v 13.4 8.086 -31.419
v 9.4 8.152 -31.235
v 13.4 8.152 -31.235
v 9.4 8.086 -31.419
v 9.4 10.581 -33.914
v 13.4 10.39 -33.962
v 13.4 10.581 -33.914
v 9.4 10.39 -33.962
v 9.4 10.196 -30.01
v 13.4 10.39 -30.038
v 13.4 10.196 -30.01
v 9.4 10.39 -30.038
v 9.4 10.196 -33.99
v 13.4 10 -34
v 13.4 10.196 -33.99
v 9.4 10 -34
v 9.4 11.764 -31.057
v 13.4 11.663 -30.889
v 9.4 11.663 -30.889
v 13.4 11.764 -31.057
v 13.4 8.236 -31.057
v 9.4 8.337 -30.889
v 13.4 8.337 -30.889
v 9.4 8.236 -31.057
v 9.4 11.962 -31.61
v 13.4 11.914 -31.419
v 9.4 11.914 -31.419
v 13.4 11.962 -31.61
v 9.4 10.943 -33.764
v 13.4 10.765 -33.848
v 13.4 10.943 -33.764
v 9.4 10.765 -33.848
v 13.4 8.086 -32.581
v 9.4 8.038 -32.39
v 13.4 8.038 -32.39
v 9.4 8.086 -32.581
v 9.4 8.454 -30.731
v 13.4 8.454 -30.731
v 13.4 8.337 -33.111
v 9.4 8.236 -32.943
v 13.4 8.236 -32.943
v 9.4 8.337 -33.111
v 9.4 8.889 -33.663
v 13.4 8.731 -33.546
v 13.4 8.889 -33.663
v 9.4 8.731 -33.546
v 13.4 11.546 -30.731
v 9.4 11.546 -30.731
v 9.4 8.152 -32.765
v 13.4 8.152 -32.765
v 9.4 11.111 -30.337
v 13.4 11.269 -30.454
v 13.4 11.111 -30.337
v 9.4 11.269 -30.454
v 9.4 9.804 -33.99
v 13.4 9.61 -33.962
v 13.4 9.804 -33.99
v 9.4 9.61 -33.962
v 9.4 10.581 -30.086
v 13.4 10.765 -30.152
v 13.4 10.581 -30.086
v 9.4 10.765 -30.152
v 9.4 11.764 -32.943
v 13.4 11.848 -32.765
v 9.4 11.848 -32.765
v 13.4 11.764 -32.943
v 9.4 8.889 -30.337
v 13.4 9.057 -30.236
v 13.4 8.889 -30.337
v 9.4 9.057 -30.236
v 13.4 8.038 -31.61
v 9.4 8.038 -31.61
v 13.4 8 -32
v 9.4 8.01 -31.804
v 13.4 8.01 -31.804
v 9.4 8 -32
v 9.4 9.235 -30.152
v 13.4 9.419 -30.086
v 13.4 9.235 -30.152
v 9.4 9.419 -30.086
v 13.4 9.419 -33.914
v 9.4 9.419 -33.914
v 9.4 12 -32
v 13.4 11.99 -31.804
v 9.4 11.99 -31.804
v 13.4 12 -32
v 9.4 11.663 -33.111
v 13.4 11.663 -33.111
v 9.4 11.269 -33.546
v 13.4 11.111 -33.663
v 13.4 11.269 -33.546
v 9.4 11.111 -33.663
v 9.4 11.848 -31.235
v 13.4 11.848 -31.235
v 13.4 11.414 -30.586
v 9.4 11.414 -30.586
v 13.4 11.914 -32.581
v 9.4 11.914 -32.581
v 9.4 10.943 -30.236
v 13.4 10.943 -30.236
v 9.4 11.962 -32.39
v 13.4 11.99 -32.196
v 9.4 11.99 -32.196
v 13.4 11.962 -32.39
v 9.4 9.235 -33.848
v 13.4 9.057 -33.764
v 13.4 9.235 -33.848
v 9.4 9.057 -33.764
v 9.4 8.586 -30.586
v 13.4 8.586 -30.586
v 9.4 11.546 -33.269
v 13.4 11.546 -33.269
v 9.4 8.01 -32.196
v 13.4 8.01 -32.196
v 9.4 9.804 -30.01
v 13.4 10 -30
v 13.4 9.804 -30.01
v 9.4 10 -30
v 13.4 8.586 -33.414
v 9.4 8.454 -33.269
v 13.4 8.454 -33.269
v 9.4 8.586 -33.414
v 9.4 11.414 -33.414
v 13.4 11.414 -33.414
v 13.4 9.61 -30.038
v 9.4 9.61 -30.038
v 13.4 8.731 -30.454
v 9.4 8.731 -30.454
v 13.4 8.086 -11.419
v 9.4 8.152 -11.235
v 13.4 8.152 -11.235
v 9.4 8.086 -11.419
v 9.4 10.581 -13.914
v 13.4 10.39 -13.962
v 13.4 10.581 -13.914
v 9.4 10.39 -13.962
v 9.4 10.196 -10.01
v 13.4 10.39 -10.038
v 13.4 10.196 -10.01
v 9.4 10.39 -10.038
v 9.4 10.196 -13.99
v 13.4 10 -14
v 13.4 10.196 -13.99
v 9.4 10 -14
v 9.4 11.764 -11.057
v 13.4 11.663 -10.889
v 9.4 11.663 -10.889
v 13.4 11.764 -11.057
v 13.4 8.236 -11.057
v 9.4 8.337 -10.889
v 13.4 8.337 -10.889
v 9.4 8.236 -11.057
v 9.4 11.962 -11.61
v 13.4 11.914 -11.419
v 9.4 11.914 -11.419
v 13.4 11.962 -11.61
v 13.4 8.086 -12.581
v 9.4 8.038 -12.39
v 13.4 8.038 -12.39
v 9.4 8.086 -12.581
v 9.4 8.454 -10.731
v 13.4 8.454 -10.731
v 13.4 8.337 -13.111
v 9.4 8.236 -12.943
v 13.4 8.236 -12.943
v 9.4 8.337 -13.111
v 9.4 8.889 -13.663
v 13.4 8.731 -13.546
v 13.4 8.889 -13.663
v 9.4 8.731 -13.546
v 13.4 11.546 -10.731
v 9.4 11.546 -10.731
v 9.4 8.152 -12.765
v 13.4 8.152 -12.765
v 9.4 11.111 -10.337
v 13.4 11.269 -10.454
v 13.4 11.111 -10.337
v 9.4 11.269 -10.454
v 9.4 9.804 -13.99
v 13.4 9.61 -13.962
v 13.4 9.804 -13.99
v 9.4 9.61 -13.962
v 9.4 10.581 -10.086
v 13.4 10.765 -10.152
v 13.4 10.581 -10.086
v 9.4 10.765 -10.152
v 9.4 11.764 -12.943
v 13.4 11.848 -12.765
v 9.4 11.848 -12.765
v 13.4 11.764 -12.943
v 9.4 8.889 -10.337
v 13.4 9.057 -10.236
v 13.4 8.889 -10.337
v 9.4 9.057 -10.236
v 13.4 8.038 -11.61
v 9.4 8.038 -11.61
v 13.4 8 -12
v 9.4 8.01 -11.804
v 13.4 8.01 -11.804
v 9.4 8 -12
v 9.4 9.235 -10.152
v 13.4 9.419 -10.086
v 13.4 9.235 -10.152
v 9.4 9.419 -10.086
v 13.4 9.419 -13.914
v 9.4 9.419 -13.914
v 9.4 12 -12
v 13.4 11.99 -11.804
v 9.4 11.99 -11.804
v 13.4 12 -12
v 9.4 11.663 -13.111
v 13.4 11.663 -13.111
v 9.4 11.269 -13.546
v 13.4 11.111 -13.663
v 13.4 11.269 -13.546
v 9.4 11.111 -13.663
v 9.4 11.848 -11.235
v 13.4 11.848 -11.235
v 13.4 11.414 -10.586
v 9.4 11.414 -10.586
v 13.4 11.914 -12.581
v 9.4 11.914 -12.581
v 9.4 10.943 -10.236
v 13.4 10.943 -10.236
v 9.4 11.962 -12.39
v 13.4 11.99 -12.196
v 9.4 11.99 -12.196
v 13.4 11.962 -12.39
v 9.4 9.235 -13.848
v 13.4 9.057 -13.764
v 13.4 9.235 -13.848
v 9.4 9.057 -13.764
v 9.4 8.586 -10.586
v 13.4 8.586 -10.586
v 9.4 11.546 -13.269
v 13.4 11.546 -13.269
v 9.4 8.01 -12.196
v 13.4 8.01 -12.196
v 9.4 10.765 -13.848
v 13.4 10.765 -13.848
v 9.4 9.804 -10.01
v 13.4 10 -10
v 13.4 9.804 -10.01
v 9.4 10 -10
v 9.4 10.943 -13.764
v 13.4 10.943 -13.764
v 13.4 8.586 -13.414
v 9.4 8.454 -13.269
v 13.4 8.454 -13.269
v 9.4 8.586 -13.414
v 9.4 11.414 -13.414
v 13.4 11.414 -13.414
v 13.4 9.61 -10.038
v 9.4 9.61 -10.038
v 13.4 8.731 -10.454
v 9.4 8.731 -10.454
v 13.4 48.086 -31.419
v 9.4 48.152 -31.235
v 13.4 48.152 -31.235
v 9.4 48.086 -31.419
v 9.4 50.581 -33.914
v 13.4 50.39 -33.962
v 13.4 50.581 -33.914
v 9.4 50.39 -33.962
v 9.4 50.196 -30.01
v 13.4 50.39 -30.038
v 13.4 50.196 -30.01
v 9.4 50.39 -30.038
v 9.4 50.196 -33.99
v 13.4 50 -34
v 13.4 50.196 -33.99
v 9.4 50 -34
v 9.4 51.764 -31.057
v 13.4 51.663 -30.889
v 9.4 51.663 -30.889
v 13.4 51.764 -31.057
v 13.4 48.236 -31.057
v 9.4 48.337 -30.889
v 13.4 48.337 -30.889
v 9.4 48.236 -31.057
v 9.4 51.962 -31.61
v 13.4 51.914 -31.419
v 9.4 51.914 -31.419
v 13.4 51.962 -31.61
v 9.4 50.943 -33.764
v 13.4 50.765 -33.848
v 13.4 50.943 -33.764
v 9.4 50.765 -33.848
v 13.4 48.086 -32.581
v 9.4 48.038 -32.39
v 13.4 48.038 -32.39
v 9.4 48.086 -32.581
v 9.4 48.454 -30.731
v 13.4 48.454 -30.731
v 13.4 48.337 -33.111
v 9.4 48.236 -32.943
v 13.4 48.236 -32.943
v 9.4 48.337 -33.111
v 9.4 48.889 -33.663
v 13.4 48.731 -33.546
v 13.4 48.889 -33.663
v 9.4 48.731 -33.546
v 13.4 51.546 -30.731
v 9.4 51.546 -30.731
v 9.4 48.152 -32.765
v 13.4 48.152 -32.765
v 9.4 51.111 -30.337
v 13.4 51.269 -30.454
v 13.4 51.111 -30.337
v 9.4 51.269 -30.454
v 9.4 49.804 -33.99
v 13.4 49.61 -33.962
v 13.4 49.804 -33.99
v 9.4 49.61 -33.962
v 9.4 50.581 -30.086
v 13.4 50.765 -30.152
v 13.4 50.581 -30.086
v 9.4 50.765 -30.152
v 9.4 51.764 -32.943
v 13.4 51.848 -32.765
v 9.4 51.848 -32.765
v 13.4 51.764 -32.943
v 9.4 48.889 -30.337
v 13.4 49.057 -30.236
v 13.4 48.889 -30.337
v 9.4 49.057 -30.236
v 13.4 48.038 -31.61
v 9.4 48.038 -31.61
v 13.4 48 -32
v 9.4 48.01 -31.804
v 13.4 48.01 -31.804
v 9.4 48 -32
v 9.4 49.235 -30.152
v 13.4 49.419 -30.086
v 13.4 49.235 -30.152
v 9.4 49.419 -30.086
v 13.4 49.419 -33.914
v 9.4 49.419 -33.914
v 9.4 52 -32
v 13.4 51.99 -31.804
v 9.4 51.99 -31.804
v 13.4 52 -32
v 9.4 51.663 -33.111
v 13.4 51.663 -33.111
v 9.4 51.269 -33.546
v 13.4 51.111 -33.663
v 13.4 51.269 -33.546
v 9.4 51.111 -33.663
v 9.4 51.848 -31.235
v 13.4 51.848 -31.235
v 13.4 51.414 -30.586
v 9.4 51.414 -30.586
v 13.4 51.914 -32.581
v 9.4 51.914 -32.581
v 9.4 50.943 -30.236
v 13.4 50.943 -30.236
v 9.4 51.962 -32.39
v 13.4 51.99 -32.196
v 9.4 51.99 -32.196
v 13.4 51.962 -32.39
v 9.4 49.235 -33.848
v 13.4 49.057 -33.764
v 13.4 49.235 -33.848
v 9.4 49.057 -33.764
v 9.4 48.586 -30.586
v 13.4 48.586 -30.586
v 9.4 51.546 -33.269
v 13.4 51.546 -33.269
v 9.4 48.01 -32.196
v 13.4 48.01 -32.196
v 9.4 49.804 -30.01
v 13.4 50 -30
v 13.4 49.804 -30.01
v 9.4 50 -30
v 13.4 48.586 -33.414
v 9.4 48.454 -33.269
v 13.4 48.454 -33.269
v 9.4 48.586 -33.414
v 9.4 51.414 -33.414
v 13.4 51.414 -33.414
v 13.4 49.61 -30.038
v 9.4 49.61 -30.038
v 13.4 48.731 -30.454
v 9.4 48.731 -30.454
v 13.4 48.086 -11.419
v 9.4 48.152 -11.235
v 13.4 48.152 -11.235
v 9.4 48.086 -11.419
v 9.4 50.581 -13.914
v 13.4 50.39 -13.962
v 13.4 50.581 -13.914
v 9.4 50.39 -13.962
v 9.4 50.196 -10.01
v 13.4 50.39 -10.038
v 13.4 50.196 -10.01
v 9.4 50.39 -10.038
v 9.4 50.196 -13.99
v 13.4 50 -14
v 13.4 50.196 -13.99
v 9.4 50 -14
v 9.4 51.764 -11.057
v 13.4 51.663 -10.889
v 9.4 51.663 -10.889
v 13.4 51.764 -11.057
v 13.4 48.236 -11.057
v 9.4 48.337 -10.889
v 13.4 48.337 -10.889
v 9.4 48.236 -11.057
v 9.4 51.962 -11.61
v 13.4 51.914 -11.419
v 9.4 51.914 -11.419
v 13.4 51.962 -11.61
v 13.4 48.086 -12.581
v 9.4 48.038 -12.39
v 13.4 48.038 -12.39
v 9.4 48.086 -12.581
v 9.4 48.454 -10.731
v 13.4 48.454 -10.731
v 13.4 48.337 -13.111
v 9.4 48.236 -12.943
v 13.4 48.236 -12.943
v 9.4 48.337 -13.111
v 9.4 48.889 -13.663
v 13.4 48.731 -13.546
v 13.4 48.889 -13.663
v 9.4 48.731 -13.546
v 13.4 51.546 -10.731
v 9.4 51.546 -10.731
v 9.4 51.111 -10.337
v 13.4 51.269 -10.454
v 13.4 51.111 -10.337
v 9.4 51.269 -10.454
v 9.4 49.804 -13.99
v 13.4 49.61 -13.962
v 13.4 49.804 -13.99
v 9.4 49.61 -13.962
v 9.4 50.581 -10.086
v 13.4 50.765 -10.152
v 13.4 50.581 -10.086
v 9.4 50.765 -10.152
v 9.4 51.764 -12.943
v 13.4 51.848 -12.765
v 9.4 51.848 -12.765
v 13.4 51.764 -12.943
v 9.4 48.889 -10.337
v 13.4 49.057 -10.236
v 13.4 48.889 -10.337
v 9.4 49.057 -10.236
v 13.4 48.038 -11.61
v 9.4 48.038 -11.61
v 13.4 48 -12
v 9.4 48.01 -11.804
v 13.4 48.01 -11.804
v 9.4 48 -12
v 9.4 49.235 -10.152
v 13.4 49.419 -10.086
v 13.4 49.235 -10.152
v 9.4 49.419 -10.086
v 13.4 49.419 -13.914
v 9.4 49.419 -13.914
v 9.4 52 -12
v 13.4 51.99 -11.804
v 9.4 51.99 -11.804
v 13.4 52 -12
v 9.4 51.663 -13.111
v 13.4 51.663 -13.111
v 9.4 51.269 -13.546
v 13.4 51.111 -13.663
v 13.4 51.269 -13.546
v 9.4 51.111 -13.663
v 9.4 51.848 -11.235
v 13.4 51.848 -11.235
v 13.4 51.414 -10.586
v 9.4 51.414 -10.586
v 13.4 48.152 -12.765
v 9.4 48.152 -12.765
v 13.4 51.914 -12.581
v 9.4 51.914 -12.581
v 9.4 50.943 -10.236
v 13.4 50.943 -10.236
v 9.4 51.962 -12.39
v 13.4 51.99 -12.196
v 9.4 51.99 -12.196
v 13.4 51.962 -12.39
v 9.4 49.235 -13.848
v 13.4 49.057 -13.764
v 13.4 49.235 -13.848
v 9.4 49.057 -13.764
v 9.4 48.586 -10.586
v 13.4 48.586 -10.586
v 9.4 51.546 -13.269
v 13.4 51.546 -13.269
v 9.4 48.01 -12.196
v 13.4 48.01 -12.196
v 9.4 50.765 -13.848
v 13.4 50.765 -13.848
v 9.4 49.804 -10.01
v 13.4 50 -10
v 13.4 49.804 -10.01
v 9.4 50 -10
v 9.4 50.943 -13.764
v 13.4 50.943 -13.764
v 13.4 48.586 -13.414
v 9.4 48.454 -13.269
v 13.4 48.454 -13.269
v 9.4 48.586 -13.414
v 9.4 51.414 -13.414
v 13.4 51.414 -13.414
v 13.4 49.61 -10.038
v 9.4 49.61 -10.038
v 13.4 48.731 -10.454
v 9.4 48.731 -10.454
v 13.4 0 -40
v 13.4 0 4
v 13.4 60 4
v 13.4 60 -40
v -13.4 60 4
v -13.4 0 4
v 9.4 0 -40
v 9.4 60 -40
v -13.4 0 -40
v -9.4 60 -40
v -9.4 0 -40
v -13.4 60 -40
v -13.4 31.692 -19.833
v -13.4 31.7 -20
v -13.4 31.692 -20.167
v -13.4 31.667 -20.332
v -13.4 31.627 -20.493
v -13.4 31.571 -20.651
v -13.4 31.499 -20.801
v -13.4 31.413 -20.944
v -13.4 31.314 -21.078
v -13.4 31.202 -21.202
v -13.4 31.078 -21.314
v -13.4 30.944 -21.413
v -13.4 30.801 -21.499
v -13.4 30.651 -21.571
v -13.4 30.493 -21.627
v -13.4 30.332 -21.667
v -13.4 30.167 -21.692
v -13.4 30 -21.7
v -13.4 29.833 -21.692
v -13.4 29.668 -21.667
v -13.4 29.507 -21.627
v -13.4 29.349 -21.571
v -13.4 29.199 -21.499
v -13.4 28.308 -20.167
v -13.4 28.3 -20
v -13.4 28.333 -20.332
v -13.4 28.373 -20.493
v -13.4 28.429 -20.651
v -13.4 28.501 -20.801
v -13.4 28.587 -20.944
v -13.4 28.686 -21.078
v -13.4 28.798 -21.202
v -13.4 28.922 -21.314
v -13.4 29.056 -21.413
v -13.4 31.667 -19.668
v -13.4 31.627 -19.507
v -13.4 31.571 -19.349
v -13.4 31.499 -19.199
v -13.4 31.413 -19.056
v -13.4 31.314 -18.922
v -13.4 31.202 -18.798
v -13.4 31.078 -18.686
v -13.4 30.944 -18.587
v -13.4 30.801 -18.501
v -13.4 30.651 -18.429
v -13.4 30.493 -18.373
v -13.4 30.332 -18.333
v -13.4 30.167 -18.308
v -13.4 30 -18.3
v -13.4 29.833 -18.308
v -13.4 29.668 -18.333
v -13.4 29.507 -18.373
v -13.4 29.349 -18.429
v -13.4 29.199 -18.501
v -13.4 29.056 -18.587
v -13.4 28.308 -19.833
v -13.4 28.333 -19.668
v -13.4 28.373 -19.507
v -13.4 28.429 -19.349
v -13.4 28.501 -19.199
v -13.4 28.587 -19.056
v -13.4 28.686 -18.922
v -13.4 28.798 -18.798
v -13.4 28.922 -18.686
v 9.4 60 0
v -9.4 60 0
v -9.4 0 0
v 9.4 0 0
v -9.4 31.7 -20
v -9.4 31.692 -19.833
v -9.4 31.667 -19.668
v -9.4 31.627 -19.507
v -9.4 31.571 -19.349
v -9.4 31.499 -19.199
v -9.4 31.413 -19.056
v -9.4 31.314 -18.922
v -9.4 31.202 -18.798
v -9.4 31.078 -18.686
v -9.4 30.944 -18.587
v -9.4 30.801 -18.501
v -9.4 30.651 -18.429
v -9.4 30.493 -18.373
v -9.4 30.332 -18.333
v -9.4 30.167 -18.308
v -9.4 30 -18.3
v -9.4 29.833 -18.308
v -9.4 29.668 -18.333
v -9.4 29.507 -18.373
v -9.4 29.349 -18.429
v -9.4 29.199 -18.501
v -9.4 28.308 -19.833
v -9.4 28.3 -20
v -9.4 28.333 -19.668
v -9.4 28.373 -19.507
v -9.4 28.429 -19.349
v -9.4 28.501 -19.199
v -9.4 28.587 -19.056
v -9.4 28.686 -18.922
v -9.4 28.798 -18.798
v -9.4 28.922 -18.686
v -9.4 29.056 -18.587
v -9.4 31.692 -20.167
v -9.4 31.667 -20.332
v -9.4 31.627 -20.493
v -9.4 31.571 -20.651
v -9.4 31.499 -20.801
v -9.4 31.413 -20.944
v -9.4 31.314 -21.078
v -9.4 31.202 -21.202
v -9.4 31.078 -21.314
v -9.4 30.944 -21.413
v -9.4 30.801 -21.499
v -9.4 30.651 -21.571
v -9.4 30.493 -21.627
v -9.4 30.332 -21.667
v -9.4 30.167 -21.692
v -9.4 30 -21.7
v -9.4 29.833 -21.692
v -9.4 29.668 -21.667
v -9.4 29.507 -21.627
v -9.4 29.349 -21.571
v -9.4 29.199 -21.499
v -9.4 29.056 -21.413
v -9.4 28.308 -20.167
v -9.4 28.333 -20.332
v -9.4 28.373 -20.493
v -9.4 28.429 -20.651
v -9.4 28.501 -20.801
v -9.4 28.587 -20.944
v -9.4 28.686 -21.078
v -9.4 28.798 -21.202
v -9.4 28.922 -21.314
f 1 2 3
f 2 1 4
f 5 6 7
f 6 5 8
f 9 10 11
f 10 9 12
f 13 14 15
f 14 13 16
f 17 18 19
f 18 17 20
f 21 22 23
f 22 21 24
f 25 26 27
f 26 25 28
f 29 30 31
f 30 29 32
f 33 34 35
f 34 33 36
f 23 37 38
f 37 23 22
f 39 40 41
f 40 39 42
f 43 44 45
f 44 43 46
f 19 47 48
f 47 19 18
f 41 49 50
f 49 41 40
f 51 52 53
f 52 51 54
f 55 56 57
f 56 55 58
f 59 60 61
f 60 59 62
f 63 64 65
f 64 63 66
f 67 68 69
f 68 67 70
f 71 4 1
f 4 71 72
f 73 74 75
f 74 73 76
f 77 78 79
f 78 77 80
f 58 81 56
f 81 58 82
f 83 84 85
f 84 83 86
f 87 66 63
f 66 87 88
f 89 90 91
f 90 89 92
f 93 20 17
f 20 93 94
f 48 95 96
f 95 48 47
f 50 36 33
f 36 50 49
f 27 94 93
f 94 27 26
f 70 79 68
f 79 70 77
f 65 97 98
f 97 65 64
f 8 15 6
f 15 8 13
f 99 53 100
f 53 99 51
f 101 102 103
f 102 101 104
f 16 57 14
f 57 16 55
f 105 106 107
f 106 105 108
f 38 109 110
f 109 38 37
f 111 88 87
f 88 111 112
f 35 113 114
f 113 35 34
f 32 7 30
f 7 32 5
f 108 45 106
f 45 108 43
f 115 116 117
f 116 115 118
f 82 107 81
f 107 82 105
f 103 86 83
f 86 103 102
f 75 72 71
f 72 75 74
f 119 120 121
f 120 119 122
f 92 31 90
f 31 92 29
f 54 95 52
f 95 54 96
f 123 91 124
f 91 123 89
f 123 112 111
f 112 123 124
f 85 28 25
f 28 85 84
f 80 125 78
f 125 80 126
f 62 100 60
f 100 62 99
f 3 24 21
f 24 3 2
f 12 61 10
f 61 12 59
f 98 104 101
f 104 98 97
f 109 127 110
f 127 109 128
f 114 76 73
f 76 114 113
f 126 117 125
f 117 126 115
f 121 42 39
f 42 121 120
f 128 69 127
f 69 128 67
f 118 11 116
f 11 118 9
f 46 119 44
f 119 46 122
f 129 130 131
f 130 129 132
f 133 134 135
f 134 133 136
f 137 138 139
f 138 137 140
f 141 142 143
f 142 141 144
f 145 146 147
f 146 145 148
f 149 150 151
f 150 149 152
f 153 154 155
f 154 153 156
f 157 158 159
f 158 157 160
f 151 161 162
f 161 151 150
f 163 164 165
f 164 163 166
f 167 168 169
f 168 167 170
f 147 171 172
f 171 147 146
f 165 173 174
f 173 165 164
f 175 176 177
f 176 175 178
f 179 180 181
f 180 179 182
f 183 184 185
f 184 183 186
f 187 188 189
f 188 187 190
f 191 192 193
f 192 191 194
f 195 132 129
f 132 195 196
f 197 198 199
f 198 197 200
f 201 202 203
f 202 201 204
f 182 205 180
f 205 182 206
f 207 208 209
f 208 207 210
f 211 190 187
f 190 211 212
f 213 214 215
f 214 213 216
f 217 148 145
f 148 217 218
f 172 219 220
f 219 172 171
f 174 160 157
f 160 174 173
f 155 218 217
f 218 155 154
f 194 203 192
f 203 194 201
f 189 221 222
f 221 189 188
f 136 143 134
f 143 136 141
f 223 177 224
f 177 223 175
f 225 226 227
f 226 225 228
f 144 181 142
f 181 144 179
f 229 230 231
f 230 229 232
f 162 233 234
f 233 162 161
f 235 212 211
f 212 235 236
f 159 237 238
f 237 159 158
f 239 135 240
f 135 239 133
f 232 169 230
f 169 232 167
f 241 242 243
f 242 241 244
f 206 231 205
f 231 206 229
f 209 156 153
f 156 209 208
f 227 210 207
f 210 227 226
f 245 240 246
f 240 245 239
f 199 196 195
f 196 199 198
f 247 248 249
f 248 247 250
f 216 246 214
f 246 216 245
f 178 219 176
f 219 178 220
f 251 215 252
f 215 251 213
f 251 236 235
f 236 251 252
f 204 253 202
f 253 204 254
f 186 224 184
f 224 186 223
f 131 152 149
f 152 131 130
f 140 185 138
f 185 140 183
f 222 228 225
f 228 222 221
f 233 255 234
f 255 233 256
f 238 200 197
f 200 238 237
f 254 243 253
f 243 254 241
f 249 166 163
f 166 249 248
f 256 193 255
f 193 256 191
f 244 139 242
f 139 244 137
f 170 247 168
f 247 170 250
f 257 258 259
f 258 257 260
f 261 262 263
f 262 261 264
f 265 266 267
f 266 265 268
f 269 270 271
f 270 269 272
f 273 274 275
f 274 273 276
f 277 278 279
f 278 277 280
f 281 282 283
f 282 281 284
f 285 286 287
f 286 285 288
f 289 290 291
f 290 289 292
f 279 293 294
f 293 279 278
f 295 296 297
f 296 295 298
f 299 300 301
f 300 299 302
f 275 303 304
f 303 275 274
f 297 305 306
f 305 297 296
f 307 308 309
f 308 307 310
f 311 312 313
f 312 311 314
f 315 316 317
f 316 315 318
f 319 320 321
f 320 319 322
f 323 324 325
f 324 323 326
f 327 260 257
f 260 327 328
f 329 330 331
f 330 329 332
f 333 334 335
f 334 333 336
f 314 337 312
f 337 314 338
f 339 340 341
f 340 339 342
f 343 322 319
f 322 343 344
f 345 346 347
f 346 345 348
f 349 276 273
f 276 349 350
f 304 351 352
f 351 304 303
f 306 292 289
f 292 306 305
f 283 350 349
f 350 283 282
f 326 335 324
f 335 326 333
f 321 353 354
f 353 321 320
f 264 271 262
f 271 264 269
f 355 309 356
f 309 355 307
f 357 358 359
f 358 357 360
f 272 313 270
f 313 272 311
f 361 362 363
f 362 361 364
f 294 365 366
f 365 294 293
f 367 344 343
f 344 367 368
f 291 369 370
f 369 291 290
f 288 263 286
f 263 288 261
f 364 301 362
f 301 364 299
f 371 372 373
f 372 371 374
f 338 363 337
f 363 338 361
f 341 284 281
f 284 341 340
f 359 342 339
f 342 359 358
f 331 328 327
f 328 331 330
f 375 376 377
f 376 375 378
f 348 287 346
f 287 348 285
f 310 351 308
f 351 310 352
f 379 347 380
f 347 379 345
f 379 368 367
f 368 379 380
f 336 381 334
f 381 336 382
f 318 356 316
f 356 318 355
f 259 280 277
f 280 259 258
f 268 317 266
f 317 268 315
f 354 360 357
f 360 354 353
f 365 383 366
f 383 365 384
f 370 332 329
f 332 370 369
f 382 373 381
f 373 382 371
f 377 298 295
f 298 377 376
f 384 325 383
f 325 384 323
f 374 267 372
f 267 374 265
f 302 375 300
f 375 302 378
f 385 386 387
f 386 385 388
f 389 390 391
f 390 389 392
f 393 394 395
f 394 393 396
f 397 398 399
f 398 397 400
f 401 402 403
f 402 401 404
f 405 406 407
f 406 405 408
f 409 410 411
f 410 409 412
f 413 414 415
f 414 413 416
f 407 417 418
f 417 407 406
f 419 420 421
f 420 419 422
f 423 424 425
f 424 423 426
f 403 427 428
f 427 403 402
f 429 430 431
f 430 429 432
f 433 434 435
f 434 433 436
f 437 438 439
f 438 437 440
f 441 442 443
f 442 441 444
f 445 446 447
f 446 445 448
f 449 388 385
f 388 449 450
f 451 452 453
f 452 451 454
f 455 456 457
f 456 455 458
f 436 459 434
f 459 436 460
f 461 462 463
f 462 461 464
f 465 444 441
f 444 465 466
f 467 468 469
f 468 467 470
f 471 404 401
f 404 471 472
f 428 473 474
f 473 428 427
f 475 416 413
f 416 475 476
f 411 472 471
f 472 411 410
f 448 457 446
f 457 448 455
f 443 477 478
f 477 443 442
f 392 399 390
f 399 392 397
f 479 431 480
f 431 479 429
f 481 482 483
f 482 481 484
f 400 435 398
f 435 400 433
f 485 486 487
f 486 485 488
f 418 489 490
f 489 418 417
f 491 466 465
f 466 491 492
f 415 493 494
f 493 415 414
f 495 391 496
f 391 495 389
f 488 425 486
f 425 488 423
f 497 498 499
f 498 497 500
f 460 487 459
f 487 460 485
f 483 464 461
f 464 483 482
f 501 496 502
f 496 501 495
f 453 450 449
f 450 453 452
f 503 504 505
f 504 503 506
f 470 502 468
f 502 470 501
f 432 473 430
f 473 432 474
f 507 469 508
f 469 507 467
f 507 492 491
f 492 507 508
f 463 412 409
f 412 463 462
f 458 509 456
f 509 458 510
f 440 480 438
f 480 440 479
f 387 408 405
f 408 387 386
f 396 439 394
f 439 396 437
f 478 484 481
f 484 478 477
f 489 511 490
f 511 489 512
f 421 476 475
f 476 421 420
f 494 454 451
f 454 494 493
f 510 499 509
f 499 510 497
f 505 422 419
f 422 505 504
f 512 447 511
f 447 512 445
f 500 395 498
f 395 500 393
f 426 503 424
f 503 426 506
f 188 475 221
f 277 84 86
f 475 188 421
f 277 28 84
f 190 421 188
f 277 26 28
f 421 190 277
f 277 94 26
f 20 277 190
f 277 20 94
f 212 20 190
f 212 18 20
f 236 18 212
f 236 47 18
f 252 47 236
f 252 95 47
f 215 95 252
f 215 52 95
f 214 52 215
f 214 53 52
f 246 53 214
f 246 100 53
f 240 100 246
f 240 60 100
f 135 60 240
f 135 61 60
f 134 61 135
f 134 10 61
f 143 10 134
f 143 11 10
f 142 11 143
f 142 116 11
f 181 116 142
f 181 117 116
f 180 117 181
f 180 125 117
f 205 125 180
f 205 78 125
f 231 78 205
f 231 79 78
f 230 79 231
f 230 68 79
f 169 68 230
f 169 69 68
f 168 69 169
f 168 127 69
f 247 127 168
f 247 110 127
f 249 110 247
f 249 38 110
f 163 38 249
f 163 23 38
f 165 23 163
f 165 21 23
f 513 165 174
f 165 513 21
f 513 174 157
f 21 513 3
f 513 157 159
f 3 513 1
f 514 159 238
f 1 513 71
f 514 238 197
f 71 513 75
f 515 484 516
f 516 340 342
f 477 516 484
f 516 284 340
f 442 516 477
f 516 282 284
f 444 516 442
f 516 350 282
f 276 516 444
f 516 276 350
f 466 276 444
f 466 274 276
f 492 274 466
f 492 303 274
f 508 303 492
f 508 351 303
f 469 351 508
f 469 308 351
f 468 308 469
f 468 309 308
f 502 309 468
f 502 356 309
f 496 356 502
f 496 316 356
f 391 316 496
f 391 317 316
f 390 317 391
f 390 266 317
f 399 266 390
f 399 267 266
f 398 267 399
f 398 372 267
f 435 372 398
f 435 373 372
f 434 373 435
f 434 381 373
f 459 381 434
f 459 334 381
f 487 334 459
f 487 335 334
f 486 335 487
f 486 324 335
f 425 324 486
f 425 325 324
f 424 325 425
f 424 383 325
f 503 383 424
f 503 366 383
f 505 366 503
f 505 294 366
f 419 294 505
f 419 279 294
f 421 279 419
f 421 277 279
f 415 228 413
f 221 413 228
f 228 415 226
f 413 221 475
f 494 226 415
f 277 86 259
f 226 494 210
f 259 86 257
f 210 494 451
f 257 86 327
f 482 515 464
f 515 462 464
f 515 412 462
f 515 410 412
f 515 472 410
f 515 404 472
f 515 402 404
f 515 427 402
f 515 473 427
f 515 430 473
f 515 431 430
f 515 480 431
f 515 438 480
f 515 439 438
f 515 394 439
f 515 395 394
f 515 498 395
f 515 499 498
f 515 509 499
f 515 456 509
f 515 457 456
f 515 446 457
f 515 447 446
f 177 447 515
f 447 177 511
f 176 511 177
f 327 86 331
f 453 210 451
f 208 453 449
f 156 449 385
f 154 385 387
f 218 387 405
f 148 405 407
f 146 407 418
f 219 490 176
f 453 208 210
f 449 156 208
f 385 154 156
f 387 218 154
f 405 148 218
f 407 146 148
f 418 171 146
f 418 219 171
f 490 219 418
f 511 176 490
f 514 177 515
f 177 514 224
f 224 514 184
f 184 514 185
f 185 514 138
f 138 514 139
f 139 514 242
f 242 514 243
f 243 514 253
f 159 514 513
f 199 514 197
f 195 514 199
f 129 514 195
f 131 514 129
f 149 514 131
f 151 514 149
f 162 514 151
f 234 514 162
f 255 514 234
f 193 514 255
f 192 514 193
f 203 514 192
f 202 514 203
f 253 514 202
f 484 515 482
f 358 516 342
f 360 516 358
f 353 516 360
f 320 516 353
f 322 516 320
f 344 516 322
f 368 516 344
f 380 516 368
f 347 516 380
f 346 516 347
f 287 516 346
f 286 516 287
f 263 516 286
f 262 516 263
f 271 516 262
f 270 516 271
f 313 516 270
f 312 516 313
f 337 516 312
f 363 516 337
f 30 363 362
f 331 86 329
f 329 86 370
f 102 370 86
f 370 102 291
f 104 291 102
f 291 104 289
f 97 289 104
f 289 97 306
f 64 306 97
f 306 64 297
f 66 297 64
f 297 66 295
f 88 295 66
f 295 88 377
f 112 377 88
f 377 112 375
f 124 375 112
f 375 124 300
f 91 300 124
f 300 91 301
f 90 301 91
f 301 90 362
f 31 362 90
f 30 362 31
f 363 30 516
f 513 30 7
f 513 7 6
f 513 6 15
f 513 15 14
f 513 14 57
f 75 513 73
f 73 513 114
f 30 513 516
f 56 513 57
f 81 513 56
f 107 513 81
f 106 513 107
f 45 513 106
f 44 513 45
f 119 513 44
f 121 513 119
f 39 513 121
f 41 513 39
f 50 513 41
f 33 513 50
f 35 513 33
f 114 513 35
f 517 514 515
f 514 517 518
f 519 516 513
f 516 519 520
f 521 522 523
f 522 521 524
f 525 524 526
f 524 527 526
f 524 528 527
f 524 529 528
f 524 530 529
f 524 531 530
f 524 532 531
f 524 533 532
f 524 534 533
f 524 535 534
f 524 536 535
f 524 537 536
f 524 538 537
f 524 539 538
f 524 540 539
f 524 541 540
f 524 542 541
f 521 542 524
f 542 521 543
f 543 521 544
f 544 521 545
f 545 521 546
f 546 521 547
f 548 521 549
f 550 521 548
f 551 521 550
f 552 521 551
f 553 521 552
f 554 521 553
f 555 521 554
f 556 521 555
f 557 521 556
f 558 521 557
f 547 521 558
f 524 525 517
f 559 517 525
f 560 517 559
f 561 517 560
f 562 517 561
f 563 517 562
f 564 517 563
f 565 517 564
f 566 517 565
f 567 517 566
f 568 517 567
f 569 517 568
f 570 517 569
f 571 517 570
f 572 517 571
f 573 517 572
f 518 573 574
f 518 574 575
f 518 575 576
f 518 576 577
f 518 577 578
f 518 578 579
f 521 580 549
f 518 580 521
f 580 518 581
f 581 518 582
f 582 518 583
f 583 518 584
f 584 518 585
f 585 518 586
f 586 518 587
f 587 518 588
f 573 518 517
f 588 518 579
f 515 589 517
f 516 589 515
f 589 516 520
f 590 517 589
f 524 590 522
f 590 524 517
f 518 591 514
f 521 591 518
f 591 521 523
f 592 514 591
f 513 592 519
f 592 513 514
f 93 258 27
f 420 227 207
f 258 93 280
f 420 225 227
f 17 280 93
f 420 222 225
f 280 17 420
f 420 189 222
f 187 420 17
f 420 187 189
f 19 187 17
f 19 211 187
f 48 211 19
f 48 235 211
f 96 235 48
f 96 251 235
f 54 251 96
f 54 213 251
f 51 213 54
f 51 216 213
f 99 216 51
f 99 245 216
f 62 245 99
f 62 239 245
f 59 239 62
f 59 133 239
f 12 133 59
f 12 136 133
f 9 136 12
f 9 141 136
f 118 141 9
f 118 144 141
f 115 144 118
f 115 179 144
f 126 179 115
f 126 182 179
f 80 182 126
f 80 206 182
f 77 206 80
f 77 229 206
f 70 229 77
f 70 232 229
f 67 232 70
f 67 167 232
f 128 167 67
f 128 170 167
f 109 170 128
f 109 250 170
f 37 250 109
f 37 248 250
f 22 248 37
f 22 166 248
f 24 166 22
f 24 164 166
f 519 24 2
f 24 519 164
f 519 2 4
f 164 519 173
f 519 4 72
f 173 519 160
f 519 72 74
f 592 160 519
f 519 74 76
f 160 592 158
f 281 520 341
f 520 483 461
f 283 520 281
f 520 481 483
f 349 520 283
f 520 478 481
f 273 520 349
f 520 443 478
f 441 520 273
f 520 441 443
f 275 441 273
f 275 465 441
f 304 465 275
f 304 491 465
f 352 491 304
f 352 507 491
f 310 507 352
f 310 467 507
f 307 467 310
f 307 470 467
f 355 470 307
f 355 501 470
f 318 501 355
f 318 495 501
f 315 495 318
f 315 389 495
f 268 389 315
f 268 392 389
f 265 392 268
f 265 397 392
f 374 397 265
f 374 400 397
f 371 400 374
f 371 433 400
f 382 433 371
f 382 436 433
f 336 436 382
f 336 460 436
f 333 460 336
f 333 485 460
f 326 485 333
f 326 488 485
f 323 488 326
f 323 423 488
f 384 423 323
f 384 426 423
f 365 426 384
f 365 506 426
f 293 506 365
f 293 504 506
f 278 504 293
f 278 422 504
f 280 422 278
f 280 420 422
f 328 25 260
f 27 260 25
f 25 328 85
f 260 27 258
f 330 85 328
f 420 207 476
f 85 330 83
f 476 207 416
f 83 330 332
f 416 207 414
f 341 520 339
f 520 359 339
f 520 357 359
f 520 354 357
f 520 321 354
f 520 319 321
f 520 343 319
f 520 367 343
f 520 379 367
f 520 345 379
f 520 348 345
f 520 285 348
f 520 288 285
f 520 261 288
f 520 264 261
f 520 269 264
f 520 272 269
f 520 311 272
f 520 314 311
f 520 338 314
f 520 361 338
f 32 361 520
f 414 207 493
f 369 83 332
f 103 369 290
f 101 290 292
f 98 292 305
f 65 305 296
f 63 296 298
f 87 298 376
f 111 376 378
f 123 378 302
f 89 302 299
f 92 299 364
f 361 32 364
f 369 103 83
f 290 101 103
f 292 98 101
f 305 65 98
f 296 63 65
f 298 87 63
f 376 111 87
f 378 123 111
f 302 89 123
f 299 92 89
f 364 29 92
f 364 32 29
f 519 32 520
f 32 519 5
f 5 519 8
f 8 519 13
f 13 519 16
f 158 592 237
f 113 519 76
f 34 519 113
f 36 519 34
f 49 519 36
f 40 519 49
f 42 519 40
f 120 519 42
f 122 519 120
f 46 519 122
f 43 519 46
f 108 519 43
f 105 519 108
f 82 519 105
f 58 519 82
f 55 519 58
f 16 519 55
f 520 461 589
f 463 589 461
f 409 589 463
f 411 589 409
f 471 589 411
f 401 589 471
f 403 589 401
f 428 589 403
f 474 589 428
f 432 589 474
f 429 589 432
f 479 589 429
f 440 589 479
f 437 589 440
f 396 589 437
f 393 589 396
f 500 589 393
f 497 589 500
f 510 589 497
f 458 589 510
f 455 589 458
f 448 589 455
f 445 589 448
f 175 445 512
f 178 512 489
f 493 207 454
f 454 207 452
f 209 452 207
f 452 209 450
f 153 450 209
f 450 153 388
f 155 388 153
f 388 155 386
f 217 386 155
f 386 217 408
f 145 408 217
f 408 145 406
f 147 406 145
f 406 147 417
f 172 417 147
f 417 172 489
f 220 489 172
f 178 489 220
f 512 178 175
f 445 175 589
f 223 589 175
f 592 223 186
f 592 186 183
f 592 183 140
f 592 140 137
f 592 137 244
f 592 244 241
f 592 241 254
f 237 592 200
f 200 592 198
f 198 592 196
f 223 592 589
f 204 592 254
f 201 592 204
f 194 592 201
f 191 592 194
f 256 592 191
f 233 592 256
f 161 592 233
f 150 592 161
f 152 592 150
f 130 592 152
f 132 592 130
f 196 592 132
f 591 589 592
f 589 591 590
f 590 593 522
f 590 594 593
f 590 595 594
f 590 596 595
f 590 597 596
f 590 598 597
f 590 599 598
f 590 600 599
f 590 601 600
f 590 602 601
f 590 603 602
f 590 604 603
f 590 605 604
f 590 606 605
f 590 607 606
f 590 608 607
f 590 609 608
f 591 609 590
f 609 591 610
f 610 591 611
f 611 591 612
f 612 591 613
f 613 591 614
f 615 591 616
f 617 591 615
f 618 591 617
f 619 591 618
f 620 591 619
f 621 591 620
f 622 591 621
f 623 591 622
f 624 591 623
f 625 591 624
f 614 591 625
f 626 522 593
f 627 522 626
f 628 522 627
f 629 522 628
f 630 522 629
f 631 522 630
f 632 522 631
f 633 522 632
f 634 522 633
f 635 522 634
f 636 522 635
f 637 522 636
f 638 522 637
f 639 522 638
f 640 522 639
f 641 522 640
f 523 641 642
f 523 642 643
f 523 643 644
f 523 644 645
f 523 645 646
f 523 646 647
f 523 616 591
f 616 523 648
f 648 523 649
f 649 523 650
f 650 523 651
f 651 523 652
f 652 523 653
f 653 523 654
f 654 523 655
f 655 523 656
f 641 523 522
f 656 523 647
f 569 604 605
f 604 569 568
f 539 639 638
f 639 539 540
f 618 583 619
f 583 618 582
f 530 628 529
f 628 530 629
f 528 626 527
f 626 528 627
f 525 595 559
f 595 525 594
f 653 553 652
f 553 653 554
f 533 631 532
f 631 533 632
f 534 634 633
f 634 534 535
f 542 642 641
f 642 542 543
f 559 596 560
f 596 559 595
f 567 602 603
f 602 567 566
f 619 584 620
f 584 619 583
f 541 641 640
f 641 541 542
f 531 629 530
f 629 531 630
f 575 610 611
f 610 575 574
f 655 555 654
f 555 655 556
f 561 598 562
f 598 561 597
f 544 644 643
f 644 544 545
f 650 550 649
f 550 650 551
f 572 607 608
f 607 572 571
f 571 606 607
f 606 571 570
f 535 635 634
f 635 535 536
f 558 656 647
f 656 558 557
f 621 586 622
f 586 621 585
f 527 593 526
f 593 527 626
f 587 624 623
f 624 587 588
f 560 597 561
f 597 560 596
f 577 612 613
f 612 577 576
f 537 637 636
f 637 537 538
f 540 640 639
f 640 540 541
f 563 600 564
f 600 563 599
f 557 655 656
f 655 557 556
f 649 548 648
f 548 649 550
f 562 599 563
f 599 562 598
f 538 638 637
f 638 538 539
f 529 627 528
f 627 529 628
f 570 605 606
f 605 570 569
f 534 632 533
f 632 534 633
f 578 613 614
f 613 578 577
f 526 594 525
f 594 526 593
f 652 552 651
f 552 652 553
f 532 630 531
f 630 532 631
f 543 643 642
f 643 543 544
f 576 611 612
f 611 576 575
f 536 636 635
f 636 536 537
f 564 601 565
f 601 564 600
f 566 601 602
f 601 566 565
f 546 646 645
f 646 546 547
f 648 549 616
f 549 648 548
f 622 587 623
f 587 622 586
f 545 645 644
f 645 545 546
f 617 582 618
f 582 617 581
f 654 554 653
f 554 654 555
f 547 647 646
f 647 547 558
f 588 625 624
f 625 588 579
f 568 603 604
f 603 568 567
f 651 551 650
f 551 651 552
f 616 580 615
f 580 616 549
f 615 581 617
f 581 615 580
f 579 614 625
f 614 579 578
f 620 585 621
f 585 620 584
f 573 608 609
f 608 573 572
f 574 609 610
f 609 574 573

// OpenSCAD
// file: nido.scad
// Nido — parámetros compartidos del sistema modular.
// Todas las medidas en milímetros. Cambia aquí y se actualizan todas las piezas.
//
// Referencias de seguridad (ver docs/seguridad.md):
//   EN 12227  → separación entre barrotes 45–65 mm, altura interior ≥ 600 mm
//   ASTM F406 → separación máxima 60 mm (2 3/8")
//   Huecos de 7–12 mm atrapan dedos: evitarlos en cualquier pieza accesible.

$fn = 64;

// --- Panel (madera contrachapada cortada con CNC) ---
panel_grosor    = 18;   // contrachapado de abedul 18 mm
panel_alto      = 650;
panel_anchos    = [400, 600, 800];
panel_hueco     = 50;   // separación entre barrotes (cumple EN 12227 y ASTM F406)
panel_barra_min = 35;   // barrote mínimo; el real se reparte según el ancho
panel_barra_obj = 40;   // barrote objetivo
panel_lateral   = 45;   // montante del borde (aquí va el perno de unión)
panel_riel_inf  = 80;
panel_riel_sup  = 90;
panel_radio     = 10;   // esquinas redondeadas de los huecos

// --- Poste (varilla de madera comprada, altura completa) ---
// Sobresale del nodo superior justo lo que entra la tapa, que queda apoyada sobre el nodo.
poste_diam  = 40;
tapa_encaje = 20;
poste_alto  = panel_alto + tapa_encaje;

// --- Nodo / abrazadera impresa (2 por poste: arriba y abajo) ---
holgura      = 0.4;   // tolerancia de impresión FDM
nodo_alto    = 70;    // debe ser < riel inferior para no tapar los huecos
nodo_pared   = 5;
nodo_brazo   = 50;    // cuánto abraza el brazo al panel
perno_diam   = 6.5;   // perno M6 con tuerca ciega
perno_z      = nodo_alto / 2;

// --- Enganche universal de módulos (cuelga del riel superior) ---
enganche_ancho = 60;
enganche_prof  = 40;   // cuánto baja por cada cara del riel

assert(panel_hueco >= 45 && panel_hueco <= 60,
       "panel_hueco fuera del rango seguro (45–60 mm)");
assert(nodo_alto < panel_riel_inf && nodo_alto < panel_riel_sup,
       "la abrazadera taparía los huecos del panel");

// Número de huecos y ancho real de barrote para un panel de ancho w.
function panel_n_huecos(w) =
    round((w - 2 * panel_lateral + panel_barra_obj) / (panel_hueco + panel_barra_obj));
function panel_barra(w) =
    let (n = panel_n_huecos(w))
    (w - 2 * panel_lateral - n * panel_hueco) / (n - 1);
// main file
// Enganche universal: la interfaz común de TODOS los módulos (luces, juegos, espejo...).
// Cuelga sobre el riel superior de cualquier panel y se fija con un tornillo
// que solo un adulto puede soltar. Un módulo nuevo solo tiene que atornillarse
// a la placa frontal (patrón de 4 tornillos M3 de 40 × 20 mm).

include <nido.scad>

patron_m3  = [40, 20];   // separación horizontal × vertical
enganche_pared = 4;

module enganche() {
    g = panel_grosor + 2 * holgura;
    t = enganche_pared;
    difference() {
        // U invertida sobre el riel
        translate([-(g / 2 + t), 0, -enganche_prof])
            cube([g + 2 * t, enganche_ancho, enganche_prof + t]);
        translate([-g / 2, -1, -enganche_prof - 1])
            cube([g, enganche_ancho + 2, enganche_prof + 1]);
        // tornillo para madera de 3 mm que entra en el riel, desde fuera del corral (x negativo)
        translate([-(g / 2 + t + 1), enganche_ancho / 2, -enganche_prof / 2])
            rotate([0, 90, 0]) cylinder(d = 3.4, h = t + 2);
        // patrón M3 en la cara interior: agujeros para insertos térmicos M3
        // (el módulo se atornilla desde dentro de su caja, así el niño no ve tornillos)
        for (dy = [-1, 1], dz = [0, 1])
            translate([g / 2 - 1, enganche_ancho / 2 + dy * patron_m3[0] / 2,
                       -enganche_prof + 8 + dz * patron_m3[1]])
                rotate([0, 90, 0]) cylinder(d = 4.0, h = t + 2);
    }
}

enganche();
